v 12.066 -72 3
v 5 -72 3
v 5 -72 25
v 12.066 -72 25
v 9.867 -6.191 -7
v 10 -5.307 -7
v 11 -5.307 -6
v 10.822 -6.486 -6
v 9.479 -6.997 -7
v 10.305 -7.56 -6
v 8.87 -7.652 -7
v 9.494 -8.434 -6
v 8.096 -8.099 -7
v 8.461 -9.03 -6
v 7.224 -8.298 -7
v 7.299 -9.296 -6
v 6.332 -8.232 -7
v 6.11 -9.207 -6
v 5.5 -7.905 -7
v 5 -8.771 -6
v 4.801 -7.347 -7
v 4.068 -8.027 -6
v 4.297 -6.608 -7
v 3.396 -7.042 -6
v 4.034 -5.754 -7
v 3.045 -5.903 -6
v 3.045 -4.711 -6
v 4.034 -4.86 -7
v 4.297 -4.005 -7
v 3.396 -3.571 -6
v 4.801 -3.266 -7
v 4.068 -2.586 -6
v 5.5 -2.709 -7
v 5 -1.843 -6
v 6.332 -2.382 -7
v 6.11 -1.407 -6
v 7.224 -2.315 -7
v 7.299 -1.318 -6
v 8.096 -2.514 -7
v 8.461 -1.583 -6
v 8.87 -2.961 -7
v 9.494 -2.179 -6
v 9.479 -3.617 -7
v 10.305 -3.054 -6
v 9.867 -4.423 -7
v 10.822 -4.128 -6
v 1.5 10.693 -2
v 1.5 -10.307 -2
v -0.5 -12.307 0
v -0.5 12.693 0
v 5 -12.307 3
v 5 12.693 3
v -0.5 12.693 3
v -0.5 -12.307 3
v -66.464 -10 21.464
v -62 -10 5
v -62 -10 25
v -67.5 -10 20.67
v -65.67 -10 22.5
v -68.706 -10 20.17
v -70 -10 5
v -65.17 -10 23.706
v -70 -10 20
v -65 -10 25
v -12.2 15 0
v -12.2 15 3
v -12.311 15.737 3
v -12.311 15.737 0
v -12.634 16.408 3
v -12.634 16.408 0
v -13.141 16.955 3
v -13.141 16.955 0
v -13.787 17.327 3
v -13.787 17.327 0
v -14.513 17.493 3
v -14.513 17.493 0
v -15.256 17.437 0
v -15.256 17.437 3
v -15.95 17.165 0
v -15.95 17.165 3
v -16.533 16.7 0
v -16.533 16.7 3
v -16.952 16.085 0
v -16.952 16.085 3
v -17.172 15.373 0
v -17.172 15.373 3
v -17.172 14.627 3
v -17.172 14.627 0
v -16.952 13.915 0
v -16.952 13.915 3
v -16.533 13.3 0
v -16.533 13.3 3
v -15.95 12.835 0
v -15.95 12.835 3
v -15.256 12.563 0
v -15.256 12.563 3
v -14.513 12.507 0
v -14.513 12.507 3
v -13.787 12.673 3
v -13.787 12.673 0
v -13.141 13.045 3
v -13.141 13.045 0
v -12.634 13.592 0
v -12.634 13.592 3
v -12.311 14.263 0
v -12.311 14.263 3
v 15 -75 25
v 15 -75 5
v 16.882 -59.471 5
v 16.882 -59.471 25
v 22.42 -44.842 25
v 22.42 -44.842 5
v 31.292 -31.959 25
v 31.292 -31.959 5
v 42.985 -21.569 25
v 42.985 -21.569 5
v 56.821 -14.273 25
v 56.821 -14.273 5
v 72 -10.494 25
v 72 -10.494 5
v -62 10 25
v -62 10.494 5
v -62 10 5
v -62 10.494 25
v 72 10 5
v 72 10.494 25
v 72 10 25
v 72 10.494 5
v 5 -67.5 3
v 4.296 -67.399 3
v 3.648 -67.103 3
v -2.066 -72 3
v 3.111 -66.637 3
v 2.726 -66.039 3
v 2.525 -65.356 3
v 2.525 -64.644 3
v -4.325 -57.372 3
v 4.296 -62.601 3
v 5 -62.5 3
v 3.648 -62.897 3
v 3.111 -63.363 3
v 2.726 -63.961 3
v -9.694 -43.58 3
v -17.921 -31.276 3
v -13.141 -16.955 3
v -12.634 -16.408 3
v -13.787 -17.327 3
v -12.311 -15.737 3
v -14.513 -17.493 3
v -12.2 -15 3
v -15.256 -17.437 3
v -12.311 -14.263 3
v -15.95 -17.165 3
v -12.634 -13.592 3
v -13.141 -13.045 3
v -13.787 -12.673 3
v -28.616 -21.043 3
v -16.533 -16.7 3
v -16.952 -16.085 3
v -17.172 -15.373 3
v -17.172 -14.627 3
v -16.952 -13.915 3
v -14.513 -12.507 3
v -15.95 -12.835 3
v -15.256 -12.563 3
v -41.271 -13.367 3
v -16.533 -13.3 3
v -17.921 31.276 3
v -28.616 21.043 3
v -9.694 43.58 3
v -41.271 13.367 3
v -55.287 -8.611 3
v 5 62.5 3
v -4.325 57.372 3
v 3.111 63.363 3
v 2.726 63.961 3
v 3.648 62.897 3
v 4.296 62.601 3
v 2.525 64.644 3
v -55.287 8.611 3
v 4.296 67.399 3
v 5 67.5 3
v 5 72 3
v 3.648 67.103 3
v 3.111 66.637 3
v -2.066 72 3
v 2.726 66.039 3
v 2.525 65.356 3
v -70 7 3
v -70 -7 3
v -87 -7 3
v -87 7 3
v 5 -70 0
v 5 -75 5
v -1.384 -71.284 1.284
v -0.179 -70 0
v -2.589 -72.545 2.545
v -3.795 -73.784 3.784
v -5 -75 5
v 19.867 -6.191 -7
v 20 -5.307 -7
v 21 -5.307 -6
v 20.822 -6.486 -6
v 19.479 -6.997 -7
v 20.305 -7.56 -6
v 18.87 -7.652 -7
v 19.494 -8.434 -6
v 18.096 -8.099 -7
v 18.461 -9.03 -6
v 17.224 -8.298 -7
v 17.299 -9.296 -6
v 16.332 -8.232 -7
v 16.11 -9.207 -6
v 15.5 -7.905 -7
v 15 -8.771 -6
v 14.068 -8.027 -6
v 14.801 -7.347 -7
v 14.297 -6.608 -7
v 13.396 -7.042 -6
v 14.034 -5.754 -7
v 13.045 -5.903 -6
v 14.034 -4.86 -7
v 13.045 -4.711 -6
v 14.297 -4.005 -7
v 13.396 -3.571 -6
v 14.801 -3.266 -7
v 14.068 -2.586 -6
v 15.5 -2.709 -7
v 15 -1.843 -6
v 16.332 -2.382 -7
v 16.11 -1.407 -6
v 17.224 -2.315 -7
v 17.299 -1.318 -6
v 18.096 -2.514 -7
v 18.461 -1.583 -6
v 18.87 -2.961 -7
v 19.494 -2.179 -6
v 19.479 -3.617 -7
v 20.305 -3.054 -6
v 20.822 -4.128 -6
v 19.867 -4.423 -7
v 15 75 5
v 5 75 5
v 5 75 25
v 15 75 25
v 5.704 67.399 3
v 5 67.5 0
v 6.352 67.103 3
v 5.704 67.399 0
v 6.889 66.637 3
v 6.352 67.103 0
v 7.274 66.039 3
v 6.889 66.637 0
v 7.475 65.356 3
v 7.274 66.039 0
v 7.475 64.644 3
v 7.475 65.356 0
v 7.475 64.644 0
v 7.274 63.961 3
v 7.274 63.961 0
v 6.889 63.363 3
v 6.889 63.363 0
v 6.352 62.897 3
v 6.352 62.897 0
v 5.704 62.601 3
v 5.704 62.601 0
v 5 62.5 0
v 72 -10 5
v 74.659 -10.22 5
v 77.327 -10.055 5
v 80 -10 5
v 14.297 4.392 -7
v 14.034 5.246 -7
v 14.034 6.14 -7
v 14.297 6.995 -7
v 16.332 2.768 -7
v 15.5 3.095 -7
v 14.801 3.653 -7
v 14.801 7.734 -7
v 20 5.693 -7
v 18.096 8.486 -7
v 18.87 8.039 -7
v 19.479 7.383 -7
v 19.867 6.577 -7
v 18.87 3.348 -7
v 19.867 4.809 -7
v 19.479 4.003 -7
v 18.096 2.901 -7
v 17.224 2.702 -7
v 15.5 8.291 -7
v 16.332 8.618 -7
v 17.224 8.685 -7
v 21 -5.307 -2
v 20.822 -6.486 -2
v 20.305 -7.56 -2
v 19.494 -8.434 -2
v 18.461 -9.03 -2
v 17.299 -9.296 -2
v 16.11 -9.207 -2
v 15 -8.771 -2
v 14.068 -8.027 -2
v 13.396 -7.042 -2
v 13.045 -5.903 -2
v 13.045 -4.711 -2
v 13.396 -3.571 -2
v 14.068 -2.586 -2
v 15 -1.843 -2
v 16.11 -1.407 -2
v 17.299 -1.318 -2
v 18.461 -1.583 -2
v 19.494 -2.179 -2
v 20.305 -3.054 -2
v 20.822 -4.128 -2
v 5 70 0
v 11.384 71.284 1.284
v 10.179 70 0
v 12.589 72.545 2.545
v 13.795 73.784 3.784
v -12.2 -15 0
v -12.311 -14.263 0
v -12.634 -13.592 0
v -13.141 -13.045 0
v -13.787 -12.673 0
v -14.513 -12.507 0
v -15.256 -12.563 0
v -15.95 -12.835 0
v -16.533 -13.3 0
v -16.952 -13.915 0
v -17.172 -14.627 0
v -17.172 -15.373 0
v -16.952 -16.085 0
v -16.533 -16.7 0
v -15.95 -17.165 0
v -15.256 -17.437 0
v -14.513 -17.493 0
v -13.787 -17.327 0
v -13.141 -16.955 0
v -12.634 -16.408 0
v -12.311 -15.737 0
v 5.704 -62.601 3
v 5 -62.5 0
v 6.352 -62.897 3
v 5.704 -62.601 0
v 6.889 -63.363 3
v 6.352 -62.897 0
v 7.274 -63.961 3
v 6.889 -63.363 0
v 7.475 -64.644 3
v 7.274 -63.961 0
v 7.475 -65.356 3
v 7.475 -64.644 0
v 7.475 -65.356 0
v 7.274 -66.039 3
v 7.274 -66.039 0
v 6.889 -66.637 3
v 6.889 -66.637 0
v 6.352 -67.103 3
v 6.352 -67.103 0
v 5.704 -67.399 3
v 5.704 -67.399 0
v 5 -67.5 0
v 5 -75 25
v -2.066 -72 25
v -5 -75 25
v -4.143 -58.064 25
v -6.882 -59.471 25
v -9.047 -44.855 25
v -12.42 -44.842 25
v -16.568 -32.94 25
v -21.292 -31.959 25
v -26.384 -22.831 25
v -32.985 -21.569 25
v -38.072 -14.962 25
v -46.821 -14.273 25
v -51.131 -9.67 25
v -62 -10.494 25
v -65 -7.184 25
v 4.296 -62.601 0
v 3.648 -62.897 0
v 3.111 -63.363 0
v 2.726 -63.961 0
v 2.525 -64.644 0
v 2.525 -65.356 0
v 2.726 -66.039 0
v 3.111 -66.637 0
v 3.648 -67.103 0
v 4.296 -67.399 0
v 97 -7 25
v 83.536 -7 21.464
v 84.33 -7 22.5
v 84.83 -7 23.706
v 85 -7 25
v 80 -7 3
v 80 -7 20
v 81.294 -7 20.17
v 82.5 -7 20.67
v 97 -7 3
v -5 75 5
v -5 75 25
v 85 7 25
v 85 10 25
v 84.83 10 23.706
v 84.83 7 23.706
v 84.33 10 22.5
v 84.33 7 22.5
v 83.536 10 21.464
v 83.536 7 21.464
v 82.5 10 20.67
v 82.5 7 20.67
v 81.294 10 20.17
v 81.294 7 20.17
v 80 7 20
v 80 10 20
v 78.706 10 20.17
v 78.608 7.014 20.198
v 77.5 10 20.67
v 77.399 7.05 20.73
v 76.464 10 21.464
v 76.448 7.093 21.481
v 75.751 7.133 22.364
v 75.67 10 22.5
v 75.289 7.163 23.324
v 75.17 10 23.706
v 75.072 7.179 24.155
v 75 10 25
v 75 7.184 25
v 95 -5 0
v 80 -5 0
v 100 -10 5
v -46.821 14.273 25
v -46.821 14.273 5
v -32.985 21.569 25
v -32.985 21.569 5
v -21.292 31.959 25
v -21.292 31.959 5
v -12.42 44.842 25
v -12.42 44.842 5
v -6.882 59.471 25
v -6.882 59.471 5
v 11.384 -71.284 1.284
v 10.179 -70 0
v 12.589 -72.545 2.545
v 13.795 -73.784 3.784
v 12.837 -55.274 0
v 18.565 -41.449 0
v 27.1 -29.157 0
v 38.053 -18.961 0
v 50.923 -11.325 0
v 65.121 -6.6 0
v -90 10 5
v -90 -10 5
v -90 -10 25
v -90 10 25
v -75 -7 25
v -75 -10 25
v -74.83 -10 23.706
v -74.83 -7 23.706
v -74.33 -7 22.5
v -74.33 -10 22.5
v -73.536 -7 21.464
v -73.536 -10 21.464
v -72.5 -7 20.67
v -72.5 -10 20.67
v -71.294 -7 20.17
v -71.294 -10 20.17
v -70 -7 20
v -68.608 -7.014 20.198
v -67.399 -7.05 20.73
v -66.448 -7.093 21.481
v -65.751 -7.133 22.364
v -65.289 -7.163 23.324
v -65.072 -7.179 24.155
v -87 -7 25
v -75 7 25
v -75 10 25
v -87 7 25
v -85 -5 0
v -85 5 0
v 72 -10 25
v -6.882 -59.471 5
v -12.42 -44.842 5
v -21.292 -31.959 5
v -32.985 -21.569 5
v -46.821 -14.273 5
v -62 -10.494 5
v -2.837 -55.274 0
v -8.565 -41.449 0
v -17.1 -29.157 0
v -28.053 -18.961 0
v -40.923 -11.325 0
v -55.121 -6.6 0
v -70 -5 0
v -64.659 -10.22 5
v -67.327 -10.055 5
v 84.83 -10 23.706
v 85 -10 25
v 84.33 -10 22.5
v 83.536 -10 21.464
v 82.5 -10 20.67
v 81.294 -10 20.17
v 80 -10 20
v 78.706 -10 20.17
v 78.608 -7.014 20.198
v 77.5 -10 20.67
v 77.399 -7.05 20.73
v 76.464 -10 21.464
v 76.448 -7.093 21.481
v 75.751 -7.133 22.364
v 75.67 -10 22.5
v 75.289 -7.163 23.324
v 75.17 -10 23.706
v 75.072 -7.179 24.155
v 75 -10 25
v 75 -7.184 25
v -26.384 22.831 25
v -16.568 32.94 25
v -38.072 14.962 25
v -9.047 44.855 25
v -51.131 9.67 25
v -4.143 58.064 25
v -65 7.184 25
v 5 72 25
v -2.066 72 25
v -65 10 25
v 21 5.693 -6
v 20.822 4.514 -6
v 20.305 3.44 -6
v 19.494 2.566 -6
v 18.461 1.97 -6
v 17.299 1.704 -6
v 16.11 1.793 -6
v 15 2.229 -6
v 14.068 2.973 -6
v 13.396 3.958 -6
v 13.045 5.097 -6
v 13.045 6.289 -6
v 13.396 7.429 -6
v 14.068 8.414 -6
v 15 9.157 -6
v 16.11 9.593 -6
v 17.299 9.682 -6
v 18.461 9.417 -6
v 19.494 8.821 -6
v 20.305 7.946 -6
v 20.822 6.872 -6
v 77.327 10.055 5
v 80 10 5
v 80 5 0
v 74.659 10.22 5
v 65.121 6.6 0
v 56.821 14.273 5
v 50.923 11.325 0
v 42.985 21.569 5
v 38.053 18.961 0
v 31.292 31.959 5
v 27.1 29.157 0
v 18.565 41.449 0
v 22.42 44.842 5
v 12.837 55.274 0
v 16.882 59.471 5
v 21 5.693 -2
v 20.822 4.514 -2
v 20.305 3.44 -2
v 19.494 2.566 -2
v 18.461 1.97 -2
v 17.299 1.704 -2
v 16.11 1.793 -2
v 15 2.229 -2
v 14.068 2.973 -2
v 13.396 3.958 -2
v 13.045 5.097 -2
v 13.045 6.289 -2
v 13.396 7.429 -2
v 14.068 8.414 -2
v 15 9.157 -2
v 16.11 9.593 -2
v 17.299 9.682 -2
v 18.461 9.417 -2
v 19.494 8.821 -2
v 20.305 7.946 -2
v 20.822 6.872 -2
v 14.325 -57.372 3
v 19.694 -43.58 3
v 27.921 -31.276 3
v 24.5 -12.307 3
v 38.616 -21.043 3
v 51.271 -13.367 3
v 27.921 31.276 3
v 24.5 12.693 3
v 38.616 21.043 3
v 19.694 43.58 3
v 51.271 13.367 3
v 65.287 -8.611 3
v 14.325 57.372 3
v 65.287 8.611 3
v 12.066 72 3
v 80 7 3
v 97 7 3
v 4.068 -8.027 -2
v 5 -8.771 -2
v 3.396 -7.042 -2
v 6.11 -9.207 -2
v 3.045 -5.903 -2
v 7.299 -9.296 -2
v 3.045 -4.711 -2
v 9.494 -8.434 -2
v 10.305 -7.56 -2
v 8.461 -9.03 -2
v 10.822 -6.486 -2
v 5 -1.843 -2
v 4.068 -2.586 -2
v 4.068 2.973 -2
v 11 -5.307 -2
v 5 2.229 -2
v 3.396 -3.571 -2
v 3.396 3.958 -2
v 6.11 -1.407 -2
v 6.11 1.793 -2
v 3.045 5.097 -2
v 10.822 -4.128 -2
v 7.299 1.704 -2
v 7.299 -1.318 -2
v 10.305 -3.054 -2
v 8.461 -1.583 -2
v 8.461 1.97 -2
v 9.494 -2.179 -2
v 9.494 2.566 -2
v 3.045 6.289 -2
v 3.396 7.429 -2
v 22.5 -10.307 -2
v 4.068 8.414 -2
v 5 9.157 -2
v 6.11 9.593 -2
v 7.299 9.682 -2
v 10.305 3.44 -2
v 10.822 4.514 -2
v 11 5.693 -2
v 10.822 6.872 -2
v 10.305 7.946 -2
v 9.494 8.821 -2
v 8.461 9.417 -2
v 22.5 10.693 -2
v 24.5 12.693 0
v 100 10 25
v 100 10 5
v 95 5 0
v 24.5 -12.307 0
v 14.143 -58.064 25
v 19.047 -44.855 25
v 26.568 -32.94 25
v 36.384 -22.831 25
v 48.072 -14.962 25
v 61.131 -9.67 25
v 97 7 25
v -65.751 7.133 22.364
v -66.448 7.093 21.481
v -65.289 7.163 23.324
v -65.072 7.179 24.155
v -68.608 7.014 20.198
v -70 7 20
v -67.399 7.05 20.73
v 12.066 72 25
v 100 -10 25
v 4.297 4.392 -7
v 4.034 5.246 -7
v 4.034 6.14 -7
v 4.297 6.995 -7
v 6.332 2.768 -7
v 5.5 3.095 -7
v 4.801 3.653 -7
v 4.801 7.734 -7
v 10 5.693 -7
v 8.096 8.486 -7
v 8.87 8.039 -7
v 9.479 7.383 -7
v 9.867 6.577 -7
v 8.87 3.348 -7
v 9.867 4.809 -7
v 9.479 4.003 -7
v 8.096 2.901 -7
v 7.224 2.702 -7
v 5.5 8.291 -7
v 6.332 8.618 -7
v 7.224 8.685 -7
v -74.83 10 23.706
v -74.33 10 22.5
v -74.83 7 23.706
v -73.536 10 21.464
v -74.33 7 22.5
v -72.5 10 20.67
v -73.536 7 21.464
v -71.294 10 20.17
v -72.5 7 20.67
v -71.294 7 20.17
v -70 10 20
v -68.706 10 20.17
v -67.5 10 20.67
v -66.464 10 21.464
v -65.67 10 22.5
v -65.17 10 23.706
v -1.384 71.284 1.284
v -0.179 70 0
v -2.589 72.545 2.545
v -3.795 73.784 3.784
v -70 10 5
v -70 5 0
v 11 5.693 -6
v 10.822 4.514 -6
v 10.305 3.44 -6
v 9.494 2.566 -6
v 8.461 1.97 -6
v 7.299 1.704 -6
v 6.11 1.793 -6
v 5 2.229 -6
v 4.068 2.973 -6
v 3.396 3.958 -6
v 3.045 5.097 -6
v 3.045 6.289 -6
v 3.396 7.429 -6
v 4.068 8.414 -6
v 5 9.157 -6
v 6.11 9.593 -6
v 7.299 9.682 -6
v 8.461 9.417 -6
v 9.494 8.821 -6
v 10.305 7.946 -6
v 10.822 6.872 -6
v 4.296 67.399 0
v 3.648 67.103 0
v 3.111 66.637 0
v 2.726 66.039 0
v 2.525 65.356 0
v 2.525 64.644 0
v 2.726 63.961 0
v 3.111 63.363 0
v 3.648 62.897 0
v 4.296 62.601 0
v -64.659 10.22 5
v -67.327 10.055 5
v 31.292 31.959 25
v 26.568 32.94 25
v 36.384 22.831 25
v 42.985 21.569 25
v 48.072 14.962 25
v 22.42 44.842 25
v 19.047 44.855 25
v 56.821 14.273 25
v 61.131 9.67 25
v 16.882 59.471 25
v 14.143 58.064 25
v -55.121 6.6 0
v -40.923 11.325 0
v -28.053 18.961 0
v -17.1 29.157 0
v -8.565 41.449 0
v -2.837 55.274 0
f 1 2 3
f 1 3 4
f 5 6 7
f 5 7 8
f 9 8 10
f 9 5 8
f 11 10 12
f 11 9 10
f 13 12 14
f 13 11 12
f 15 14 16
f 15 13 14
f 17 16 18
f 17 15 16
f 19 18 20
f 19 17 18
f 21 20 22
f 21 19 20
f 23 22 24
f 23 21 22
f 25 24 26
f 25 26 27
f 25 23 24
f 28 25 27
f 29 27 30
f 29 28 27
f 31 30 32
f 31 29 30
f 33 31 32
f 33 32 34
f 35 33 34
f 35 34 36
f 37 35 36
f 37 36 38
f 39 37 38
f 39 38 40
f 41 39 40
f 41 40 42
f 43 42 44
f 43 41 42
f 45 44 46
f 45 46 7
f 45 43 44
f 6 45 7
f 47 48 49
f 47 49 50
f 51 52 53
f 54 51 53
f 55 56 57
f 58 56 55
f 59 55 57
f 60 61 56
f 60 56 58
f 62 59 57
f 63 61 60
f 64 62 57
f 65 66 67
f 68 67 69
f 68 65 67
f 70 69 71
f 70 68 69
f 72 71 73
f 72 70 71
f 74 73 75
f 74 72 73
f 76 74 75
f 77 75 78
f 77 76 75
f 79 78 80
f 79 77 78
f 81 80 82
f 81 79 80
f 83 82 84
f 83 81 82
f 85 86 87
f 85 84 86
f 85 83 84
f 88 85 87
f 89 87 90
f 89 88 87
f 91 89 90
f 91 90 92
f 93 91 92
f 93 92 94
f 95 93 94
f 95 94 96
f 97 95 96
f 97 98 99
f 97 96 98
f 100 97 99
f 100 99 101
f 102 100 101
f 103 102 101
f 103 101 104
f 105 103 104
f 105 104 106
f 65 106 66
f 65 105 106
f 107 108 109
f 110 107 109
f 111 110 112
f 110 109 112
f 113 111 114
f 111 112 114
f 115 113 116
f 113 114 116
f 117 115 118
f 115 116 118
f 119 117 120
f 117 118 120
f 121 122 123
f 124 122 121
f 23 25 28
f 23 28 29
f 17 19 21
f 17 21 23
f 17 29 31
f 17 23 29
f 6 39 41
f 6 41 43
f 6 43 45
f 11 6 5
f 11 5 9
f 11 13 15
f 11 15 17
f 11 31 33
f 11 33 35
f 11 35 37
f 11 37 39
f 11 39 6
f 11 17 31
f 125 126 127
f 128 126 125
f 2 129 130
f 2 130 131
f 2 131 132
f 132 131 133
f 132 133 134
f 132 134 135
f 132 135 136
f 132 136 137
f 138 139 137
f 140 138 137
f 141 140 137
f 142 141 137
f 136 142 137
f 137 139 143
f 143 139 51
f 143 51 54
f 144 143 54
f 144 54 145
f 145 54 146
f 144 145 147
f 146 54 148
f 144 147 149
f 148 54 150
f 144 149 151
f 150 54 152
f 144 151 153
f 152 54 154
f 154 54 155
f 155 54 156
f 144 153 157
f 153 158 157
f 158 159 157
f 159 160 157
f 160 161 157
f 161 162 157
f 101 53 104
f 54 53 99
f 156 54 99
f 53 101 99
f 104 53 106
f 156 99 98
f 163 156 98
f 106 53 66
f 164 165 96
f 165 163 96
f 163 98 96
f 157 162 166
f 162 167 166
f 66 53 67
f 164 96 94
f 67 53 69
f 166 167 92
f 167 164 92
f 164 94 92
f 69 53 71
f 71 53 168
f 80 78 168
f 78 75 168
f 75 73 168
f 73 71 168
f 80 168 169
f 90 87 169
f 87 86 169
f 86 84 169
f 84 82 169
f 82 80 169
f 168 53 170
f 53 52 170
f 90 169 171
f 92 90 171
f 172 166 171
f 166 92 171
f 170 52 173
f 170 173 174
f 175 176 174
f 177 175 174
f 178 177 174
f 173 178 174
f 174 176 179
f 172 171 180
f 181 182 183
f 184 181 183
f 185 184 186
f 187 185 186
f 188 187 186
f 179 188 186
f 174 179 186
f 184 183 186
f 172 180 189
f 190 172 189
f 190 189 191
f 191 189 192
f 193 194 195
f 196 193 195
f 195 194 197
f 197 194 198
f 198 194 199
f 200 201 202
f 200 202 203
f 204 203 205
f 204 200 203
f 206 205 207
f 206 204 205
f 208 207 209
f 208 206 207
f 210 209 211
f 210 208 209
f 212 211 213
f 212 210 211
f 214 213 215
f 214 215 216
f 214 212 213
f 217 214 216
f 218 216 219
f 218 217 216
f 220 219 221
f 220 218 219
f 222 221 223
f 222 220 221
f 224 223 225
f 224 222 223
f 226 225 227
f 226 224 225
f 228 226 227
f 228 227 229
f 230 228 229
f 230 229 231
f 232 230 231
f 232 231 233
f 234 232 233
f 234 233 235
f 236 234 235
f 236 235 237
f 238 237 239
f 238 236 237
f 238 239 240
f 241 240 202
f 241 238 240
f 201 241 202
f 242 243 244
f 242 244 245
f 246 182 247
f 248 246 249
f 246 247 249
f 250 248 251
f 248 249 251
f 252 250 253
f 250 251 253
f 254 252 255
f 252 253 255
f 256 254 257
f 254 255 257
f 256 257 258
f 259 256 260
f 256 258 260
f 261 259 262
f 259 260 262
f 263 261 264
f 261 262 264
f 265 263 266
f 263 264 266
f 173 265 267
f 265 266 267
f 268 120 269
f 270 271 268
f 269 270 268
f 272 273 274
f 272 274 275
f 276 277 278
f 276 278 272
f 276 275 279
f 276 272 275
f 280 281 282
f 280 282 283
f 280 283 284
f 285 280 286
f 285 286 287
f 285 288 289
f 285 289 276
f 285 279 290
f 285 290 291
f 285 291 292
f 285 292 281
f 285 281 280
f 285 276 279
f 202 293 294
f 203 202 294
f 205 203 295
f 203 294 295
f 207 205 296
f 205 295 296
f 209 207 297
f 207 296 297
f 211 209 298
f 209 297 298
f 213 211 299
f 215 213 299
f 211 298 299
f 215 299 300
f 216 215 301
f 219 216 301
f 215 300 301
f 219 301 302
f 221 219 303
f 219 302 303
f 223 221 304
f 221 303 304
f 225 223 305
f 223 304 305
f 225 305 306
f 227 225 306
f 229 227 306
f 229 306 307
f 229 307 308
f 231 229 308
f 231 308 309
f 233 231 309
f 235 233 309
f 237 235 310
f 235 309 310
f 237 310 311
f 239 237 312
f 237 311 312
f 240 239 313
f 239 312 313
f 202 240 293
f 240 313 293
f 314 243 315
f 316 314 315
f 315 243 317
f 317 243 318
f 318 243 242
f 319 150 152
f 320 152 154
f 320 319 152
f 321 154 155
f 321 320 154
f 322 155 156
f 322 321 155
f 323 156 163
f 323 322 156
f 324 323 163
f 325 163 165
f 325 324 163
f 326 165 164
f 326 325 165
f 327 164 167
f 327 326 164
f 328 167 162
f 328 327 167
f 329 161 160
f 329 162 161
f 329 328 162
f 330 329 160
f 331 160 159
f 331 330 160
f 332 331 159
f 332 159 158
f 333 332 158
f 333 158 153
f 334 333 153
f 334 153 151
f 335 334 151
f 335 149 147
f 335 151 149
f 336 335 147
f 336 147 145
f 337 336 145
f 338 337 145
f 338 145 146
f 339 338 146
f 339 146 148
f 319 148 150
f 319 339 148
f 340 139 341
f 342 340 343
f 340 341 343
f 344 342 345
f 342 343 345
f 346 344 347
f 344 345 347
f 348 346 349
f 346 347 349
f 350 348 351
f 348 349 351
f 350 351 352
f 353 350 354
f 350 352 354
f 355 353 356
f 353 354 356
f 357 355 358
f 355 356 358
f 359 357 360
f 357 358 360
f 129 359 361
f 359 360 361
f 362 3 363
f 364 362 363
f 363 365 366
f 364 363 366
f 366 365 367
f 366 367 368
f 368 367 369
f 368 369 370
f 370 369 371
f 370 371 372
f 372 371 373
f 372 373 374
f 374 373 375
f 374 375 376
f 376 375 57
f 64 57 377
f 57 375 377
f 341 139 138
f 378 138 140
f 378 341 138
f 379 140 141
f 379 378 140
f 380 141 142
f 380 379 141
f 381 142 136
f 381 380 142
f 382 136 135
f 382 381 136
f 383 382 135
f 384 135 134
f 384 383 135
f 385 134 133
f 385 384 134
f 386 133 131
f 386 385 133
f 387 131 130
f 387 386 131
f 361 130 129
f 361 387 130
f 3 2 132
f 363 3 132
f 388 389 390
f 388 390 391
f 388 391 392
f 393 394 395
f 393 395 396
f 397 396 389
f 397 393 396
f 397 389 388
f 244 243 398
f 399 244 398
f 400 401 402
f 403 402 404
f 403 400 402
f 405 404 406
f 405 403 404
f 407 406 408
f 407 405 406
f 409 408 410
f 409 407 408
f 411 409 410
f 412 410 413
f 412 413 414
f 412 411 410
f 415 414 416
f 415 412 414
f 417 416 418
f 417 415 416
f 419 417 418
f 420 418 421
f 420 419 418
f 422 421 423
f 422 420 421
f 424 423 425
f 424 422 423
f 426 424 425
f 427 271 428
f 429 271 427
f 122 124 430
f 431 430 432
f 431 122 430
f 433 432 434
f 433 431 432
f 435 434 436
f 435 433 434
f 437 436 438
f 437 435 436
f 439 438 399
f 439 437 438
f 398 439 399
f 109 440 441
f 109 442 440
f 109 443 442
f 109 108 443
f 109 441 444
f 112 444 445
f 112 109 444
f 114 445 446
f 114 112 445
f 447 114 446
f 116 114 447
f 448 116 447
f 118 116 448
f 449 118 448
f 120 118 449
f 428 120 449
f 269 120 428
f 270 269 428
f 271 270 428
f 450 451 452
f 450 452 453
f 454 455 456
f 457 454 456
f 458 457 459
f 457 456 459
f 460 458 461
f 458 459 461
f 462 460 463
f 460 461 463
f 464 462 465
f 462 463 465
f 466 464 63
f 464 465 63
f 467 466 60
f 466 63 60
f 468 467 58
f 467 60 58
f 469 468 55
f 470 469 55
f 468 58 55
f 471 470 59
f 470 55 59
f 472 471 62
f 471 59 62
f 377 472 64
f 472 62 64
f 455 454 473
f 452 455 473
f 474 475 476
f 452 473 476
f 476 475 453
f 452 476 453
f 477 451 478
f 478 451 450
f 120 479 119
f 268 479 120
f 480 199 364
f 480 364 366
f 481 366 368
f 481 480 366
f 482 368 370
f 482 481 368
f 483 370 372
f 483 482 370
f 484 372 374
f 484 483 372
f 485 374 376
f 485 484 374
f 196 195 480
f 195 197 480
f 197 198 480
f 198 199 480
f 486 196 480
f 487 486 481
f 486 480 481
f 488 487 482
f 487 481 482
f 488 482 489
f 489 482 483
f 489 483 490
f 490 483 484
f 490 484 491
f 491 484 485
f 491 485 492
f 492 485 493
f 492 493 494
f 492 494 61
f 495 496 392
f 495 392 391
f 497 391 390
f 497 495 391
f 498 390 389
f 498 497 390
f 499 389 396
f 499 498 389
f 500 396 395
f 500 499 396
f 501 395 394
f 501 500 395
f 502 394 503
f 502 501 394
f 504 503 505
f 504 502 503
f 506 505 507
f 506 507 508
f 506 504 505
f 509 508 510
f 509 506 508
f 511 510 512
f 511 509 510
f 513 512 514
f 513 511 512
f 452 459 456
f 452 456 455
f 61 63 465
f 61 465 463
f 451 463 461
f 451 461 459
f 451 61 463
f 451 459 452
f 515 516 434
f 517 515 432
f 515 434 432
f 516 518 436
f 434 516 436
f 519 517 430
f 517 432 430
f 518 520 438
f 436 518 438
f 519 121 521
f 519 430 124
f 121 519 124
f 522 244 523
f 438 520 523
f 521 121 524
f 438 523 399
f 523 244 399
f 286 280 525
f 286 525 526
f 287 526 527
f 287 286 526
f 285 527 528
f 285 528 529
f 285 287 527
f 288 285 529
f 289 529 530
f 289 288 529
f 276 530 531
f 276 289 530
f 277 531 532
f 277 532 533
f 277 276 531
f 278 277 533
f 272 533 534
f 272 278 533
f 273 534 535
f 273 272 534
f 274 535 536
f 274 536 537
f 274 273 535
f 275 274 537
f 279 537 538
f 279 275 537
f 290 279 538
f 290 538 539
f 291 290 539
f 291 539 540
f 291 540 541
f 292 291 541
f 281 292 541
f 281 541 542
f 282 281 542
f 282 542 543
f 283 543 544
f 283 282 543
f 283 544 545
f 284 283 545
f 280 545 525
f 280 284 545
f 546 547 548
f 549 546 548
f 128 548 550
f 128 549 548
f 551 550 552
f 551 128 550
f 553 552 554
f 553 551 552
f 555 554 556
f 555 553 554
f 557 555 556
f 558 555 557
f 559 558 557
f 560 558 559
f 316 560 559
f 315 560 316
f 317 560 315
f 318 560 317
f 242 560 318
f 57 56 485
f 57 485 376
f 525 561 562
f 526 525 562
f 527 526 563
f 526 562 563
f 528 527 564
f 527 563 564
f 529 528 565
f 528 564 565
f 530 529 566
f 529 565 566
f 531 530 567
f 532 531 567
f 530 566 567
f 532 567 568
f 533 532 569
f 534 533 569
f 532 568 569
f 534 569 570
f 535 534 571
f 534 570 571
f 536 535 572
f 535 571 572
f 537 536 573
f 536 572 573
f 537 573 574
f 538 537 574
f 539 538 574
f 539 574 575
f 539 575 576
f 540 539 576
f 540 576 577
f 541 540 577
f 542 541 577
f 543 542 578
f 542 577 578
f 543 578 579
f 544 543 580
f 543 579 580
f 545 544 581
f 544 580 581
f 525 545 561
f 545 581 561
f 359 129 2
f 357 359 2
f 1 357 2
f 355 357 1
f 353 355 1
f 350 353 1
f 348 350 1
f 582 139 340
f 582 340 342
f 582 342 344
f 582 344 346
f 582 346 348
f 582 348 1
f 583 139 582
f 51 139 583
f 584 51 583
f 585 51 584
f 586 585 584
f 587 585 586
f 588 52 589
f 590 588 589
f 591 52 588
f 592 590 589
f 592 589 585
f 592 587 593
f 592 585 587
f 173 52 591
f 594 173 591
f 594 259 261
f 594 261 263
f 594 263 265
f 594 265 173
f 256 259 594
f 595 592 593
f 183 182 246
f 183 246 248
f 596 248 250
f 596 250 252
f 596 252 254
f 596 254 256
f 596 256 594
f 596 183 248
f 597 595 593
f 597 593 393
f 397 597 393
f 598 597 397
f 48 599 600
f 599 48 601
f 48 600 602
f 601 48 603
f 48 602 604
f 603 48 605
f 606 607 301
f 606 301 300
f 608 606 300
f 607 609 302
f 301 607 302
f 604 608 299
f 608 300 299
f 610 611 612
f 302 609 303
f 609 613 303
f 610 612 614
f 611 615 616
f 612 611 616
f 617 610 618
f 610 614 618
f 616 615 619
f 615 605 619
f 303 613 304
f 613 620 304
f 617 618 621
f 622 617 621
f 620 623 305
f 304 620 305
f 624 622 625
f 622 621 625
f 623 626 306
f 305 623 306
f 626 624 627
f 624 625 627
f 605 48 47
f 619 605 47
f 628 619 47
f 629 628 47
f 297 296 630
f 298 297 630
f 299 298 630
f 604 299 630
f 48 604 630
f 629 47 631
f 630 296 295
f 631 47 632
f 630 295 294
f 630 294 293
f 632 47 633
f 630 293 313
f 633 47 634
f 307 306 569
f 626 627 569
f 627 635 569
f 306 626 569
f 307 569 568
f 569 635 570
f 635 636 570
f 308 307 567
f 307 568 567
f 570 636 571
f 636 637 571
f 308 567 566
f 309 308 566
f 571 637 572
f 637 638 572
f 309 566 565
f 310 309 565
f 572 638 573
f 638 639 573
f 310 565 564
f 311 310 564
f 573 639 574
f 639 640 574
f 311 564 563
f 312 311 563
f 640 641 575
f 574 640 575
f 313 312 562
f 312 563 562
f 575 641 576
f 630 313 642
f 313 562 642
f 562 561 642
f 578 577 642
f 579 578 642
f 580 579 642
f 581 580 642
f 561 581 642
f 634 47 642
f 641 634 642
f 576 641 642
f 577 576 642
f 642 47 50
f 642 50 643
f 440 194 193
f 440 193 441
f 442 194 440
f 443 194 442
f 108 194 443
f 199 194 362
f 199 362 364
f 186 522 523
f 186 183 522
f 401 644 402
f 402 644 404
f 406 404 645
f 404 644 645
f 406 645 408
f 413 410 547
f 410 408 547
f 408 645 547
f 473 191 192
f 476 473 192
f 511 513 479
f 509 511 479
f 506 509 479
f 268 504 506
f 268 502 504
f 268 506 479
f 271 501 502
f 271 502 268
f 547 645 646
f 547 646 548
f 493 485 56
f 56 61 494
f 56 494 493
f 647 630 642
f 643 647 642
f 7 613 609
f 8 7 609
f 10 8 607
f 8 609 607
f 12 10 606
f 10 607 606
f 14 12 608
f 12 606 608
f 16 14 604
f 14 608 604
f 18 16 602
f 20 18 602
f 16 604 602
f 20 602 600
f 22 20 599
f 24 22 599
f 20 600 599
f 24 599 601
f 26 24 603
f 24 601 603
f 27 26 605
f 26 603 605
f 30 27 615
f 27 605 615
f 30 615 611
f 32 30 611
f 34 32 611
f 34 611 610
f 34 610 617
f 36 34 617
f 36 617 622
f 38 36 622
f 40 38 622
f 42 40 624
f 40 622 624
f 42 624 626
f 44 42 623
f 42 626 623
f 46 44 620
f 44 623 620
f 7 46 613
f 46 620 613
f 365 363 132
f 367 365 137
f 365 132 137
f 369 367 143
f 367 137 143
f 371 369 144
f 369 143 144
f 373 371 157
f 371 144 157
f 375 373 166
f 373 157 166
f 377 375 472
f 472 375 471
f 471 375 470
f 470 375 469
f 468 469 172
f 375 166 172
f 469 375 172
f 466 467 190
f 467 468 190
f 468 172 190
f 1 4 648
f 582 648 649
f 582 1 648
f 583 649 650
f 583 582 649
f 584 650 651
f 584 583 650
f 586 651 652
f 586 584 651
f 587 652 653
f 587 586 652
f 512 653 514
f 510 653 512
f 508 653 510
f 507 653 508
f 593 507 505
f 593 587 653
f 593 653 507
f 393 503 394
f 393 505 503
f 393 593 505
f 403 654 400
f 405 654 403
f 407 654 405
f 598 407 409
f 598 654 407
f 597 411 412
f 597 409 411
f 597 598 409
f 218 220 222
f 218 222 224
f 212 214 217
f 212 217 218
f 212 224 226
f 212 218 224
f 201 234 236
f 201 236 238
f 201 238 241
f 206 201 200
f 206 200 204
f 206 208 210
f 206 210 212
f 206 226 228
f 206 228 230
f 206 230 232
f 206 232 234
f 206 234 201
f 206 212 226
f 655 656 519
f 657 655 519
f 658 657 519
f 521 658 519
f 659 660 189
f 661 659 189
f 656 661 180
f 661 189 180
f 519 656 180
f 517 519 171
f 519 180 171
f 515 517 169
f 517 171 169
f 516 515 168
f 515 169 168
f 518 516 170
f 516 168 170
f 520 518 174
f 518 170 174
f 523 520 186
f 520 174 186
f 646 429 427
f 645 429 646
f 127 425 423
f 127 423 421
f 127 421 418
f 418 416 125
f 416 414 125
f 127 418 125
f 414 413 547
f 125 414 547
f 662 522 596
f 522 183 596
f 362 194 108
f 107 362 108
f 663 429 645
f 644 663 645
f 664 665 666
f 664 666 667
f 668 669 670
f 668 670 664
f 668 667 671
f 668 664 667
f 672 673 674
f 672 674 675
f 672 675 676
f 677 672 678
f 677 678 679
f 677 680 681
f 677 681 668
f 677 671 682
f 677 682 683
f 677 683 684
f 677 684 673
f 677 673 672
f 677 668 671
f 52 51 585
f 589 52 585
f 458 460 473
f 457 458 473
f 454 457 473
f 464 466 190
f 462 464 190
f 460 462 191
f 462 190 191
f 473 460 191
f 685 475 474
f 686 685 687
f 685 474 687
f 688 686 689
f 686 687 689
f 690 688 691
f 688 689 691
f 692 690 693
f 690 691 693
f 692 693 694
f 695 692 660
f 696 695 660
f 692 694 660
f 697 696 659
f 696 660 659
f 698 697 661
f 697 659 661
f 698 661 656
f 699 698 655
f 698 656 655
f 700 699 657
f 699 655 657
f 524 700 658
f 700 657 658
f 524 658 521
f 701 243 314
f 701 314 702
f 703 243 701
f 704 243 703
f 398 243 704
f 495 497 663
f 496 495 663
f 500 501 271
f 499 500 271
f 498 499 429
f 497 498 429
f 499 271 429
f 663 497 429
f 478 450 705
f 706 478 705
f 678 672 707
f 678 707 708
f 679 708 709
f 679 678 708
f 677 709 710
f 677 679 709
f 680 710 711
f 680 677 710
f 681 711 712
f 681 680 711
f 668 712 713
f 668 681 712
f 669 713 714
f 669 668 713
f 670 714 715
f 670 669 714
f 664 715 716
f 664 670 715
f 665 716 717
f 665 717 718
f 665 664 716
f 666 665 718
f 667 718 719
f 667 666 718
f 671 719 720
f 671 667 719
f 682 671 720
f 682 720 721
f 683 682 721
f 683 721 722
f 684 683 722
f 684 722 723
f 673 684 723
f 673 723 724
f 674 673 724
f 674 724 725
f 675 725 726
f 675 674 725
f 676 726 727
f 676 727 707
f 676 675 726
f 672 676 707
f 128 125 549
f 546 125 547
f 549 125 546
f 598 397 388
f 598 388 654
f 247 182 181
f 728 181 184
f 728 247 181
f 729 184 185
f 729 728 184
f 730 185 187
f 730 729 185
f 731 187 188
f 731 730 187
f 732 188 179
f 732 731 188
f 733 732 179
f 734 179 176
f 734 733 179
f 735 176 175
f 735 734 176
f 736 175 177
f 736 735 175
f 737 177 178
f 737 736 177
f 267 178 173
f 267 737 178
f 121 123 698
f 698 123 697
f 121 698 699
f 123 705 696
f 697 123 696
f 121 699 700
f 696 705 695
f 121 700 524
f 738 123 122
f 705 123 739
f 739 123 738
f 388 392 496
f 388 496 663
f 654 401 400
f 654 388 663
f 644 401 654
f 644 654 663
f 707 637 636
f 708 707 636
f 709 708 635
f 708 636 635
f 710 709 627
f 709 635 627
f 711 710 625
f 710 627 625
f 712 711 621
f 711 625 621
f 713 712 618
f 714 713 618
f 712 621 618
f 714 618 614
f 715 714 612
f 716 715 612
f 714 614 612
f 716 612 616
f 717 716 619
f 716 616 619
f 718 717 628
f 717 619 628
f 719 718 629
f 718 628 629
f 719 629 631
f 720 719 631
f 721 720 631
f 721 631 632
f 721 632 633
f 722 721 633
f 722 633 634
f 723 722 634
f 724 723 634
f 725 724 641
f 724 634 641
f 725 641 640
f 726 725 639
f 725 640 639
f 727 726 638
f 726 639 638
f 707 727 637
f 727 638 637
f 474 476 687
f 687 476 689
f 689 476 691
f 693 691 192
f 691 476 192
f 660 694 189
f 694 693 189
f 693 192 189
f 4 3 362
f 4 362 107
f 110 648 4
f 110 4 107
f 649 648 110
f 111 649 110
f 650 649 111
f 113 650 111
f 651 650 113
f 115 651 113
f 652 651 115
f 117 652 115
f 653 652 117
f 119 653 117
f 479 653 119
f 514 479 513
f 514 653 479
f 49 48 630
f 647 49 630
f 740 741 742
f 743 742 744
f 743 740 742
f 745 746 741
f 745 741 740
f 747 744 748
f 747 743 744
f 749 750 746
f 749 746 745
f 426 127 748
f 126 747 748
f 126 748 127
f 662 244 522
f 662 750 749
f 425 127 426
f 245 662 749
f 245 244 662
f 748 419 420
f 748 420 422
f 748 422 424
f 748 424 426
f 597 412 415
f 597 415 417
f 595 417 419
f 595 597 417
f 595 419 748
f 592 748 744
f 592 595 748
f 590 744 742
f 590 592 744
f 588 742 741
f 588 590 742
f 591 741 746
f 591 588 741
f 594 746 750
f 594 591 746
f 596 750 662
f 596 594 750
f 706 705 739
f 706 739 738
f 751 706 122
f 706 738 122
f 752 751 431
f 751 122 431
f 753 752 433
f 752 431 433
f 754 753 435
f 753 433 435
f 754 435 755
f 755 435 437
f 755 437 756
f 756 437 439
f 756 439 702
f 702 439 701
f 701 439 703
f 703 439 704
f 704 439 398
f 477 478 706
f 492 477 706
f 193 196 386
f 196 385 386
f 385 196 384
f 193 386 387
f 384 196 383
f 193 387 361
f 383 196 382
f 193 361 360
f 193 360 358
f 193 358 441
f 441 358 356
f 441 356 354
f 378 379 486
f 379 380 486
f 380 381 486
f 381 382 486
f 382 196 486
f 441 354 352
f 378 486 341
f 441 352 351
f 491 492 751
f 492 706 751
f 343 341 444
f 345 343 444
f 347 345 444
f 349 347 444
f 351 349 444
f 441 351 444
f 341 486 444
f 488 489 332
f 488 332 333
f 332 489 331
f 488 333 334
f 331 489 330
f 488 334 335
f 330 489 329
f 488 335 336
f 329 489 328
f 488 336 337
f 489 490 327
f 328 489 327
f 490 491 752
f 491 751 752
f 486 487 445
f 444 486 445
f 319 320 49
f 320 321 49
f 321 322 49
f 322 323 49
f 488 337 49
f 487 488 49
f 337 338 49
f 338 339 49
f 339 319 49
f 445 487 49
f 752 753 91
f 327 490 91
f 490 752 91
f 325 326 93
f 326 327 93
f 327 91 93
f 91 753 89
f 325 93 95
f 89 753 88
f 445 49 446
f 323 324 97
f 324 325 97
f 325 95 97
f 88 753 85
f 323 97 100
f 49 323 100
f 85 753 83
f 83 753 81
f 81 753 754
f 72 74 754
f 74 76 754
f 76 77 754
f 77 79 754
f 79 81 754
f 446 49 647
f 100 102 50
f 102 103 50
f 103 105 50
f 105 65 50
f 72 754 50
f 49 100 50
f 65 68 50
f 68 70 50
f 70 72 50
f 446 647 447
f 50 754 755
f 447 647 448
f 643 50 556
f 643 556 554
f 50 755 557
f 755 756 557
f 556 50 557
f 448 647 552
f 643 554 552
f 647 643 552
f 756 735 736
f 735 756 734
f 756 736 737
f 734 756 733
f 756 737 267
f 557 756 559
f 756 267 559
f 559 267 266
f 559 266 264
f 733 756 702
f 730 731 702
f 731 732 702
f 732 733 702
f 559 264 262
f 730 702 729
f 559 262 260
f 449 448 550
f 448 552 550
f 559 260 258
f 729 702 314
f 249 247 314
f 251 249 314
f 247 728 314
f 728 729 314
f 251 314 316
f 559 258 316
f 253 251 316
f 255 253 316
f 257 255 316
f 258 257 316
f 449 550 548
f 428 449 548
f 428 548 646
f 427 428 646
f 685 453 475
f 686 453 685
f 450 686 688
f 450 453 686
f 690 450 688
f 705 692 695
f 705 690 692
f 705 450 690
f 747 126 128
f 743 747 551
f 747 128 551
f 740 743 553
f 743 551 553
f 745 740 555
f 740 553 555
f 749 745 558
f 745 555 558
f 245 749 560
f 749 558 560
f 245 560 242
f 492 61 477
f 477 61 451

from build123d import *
from build123d.topology import SkipClean

# Parameters (mm, degrees)
SKETCH1_W               = 200
SKETCH1_H               = 150
BOSS_EXTRUDE1_DEPTH     = 25
CUT_EXTRUDE2_DEPTH      = 30
SHELL2_T                = -3
SKETCH6_R               = 2.5
CUT_EXTRUDE3_DEPTH      = 30
CUT_EXTRUDE4_DEPTH      = 30
CUT_EXTRUDE4_DEPTH_BACK = 30
SKETCH7_R               = 5
CHAMFER1_SIZE           = 5
SKETCH8_R               = 2.5
CUT_EXTRUDE5_DEPTH      = 10
SKETCH9_W               = 105
SKETCH9_H               = 150
CUT_EXTRUDE8_DEPTH      = 50
SKETCH10_R              = 2.5
CUT_EXTRUDE9_DEPTH      = 50
SKETCH11_W              = 20
SKETCH11_H              = 2.690986913
SKETCH11_W_2            = 20.020411306
SKETCH11_H_2            = 2.771183394
CUT_EXTRUDE10_DEPTH     = 28
SKETCH12_W              = 20
SKETCH12_H              = 3.926823093
CUT_EXTRUDE11_DEPTH     = 28
SKETCH_1_W              = 25
SKETCH_1_H              = 25
EXTRUDE_1_DEPTH         = 5
CHAMFER_1_SIZE          = 2
SKETCH_2_R              = 4
EXTRUDE_2_DEPTH         = 5
CHAMFER_4_SIZE          = 1


with BuildPart() as part:
    # Sketch1 → Boss-Extrude1 (new body)
    with BuildSketch(Plane.XY):
        Rectangle(SKETCH1_W, SKETCH1_H)
    extrude(amount=BOSS_EXTRUDE1_DEPTH)

    # Sketch5 → Cut-Extrude2 (cut)
    with BuildSketch(Plane(origin=(0, 0, 0), x_dir=(-1, 0, 0), z_dir=(0, 0, -1))):
        with BuildLine():
            Line((100, 75), (5, 75))
            ThreePointArc((5, 75), (24.038059223, 29.038059223), (70, 10))
            Line((70, 10), (100, 10))
            Line((100, 10), (100, 75))
        make_face()
        with BuildLine():
            ThreePointArc((70, -10), (24.038059223, -29.038059223), (5, -75))
            Line((5, -75), (100, -75))
            Line((100, -75), (100, -10))
            Line((100, -10), (70, -10))
        make_face()
        with BuildLine():
            Line((-80, -10), (-100, -10))
            Line((-100, -10), (-100, -75))
            Line((-100, -75), (-15, -75))
            ThreePointArc((-15, -75), (-34.038059223, -29.038059223), (-80, -10))
        make_face()
        with BuildLine():
            Line((-100, 75), (-100, 10))
            Line((-100, 10), (-80, 10))
            ThreePointArc((-80, 10), (-34.038059223, 29.038059223), (-15, 75))
            Line((-15, 75), (-100, 75))
        make_face()
    extrude(amount=-CUT_EXTRUDE2_DEPTH, mode=Mode.SUBTRACT)

    # Shell2
    shell2_openings = [part.faces().sort_by_distance(p)[0] for p in [
        (3.044348512, 0, 25),
    ]]
    offset(amount=SHELL2_T, openings=shell2_openings, kind=Kind.INTERSECTION)

    # Sketch6 → Cut-Extrude3 (cut)
    with BuildSketch(Plane(origin=(0, 0, 0), x_dir=(-1, 0, 0), z_dir=(0, 0, -1))):
        with Locations((-5, 65)):
            Circle(SKETCH6_R)
        with Locations((-5, -65)):
            Circle(SKETCH6_R)
    extrude(amount=-CUT_EXTRUDE3_DEPTH, mode=Mode.SUBTRACT)

    # Sketch7 → Cut-Extrude4 (cut, two sides: drawn at the far end of the back side and taken through both)
    with BuildSketch(Plane(origin=(0, 0, 0), x_dir=(1, 0, 0), z_dir=(0, 1, 0)).offset(-CUT_EXTRUDE4_DEPTH_BACK)):
        with Locations((-80, -25)):
            Circle(SKETCH7_R)
        with Locations((80, -25)):
            Circle(SKETCH7_R)
    extrude(amount=CUT_EXTRUDE4_DEPTH + CUT_EXTRUDE4_DEPTH_BACK, mode=Mode.SUBTRACT)

    # Chamfer1
    chamfer1_edges = [part.edges().sort_by_distance(p)[0] for p in [
        (-100, 0, 0),
        (5, 75, 0),
        (100, 0, 0),
        (5, -75, 0),
        (90, 10, 0),
        (34.038059223, 29.038059223, 0),
        (34.038059223, -29.038059223, 0),
        (90, -10, 0),
        (-24.038059223, -29.038059223, 0),
        (-85, -10, 0),
        (-24.038059223, 29.038059223, 0),
        (-85, 10, 0),
    ]]
    chamfer(chamfer1_edges, length=CHAMFER1_SIZE)

    # Sketch8 → Cut-Extrude5 (cut)
    with BuildSketch(Plane.XY.offset(3)):
        with Locations((-22, 15)):
            Circle(SKETCH8_R)
        with Locations((-22, -15)):
            Circle(SKETCH8_R)
    extrude(amount=-CUT_EXTRUDE5_DEPTH, mode=Mode.SUBTRACT)

    # Sketch9 → Cut-Extrude8 (cut)
    with BuildSketch(Plane.XY):
        with Locations((-47.5, 0)):
            Rectangle(SKETCH9_W, SKETCH9_H)
    extrude(amount=CUT_EXTRUDE8_DEPTH, mode=Mode.SUBTRACT)

    # Mirror4: part across plane


with BuildPart() as part_1:
    with SkipClean():  # the faces are left unmerged after this step: merging them gives an invalid solid
        add(part.part)
        add(part.part.mirror(Plane(origin=(5, 75, 50), x_dir=(0, 0, 1), z_dir=(-1, 0, 0))))

    # Sketch10 → Cut-Extrude9 (cut)
    with SkipClean():  # the faces are left unmerged after this step: merging them gives an invalid solid
        with BuildSketch(Plane.XY):
            with Locations((-14.7, 15)):
                Circle(SKETCH10_R)
            with Locations((-14.7, -15)):
                Circle(SKETCH10_R)
        extrude(amount=CUT_EXTRUDE9_DEPTH, mode=Mode.SUBTRACT)

    # Sketch11 → Cut-Extrude10 (cut)
    with SkipClean():  # the faces are left unmerged after this step: merging them gives an invalid solid
        with BuildSketch(Plane.ZY.offset(90)):
            with Locations((15, 11.345493457)):
                Rectangle(SKETCH11_W, SKETCH11_H)
            with Locations((15.010205653, -11.385591697)):
                Rectangle(SKETCH11_W_2, SKETCH11_H_2)
        extrude(amount=-CUT_EXTRUDE10_DEPTH, mode=Mode.SUBTRACT)

    # Sketch12 → Cut-Extrude11 (cut)
    with SkipClean():  # the faces are left unmerged after this step: merging them gives an invalid solid
        with BuildSketch(Plane(origin=(100, 0, 0), x_dir=(0, 0, -1), z_dir=(1, 0, 0))):
            with Locations((-15, 11.963411547)):
                Rectangle(SKETCH12_W, SKETCH12_H)
            with Locations((-15, -11.963411547)):
                Rectangle(SKETCH12_W, SKETCH12_H)
        extrude(amount=-CUT_EXTRUDE11_DEPTH, mode=Mode.SUBTRACT)

    # 草图1 → 凸台-拉伸1 (add)
    with SkipClean():  # the faces are left unmerged after this step: merging them gives an invalid solid
        with BuildSketch(Plane.XY.offset(3)):
            with Locations((12, 0.193209558)):
                Rectangle(SKETCH_1_W, SKETCH_1_H)
        extrude(amount=-EXTRUDE_1_DEPTH)

    # 倒角1
    chamfer_1_edges = [part_1.edges().sort_by_distance(p)[0] for p in [
        (12, 12.693209558, -2),
        (-0.5, 0.193209558, -2),
        (12, -12.306790442, -2),
        (24.5, 0.193209558, -2),
    ]]
    chamfer(chamfer_1_edges, length=CHAMFER_1_SIZE - 0.0001)  # a hair under: the kernel refuses the full size

    # 草图2 → 凸台-拉伸2 (add)
    with BuildSketch(Plane(origin=(0, 0, -2), x_dir=(-1, 0, 0), z_dir=(0, 0, -1))):
        with Locations(Location((-17, 5.693209558, 0), (0, 0, 180))):
            Circle(SKETCH_2_R)
        with Locations(Location((-7, 5.693209558, 0), (0, 0, 180))):
            Circle(SKETCH_2_R)
        with Locations(Location((-17, -5.306790442, 0), (0, 0, 180))):
            Circle(SKETCH_2_R)
        with Locations(Location((-7, -5.306790442, 0), (0, 0, 180))):
            Circle(SKETCH_2_R)
    extrude(amount=EXTRUDE_2_DEPTH)

    # 倒角4
    chamfer_4_edges = [part_1.edges().sort_by_distance(p)[0] for p in [
        (13, 5.693209558, -7),
        (13, -5.306790442, -7),
        (3, 5.693209558, -7),
        (3, -5.306790442, -7),
    ]]
    chamfer(chamfer_4_edges, length=CHAMFER_4_SIZE)


solid = part_1.part
